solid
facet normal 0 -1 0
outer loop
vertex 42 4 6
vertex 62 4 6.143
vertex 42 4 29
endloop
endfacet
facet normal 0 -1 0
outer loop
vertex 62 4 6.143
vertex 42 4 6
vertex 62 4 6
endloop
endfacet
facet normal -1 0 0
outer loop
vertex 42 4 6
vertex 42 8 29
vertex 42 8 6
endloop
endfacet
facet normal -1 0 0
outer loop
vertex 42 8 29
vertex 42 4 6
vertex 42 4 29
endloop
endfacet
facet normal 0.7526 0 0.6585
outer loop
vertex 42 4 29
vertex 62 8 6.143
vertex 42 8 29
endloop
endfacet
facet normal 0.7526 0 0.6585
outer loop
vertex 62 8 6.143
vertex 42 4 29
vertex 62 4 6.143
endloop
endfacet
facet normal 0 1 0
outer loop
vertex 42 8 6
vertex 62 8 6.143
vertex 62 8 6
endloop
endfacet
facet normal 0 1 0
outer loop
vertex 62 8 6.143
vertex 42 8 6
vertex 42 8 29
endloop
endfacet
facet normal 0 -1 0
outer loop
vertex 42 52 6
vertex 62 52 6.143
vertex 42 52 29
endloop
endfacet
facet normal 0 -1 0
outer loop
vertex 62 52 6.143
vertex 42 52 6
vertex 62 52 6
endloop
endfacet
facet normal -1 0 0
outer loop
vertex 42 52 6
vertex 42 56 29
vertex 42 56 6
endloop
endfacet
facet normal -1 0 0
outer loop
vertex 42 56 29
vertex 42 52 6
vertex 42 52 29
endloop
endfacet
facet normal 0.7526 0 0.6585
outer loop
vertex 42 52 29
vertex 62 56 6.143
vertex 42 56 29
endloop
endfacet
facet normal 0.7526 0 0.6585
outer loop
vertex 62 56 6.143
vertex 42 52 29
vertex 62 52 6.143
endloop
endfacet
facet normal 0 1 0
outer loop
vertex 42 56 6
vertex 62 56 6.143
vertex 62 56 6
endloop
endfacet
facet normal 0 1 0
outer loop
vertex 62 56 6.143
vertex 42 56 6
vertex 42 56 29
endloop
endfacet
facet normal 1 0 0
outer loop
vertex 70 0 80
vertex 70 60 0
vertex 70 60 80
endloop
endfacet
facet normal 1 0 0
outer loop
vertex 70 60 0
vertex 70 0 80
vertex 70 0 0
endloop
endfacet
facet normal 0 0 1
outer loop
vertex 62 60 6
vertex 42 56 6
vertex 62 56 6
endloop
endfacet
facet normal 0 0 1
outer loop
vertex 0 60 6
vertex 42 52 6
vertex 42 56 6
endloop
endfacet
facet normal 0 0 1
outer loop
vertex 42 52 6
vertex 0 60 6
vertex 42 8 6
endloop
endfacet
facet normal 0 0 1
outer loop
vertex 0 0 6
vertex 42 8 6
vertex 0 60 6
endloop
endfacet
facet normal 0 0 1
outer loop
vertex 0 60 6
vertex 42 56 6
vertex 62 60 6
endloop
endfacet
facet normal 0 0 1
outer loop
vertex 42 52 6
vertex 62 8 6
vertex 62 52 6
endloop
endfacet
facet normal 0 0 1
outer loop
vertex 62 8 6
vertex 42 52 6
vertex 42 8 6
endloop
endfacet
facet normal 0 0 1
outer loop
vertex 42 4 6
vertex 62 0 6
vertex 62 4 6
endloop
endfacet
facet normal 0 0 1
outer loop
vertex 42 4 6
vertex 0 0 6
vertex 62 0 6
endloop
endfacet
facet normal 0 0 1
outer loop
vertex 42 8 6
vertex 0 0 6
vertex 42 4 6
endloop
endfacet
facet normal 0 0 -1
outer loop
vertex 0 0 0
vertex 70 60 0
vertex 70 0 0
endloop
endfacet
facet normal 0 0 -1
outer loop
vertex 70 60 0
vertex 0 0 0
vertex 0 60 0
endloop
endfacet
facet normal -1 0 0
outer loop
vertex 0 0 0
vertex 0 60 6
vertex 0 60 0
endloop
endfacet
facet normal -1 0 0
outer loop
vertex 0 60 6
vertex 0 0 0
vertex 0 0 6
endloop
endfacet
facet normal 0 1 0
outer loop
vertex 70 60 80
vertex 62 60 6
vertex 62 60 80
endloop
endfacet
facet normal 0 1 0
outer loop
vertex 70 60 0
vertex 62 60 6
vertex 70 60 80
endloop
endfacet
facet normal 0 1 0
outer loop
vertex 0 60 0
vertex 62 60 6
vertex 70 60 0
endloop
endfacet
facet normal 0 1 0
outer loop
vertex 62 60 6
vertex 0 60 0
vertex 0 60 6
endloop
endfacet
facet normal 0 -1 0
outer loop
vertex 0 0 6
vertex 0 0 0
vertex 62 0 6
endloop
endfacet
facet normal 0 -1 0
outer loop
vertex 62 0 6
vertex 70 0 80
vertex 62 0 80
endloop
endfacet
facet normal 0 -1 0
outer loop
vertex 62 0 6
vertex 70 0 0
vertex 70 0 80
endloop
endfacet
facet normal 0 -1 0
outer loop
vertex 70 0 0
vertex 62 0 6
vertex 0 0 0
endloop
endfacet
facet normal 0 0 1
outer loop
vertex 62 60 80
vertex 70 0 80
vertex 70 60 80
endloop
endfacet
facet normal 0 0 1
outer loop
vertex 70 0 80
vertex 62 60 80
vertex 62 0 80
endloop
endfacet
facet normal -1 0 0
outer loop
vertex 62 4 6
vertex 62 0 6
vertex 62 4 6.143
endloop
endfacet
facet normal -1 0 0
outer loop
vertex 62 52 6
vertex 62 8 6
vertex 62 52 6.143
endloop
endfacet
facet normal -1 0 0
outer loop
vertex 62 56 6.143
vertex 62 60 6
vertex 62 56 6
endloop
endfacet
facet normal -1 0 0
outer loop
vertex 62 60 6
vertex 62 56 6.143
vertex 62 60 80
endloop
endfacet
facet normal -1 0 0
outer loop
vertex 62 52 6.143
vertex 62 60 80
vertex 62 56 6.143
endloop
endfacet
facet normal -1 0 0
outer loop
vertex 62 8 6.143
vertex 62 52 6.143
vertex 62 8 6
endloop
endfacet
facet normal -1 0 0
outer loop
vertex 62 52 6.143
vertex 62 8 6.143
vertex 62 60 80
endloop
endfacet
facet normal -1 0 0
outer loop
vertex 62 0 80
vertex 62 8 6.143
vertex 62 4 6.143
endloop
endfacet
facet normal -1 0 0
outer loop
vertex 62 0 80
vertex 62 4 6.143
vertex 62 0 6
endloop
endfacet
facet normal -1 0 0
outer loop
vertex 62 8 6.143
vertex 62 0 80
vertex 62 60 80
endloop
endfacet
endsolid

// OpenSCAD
$fn = 32;

// ----------------------------------------------------------------------
// Rib bracket: 2-gusset L bracket
// ----------------------------------------------------------------------

// --- parameters (mm) ---
base_l = 70;              // foot length, X
base_w = 60;              // foot width, Y
base_t = 6;               // foot thickness
plate_t = 8;              // upright plate thickness
plate_h = 80;             // overall height
gus_l = 20;               // gusset leg along the foot
gus_h = 24;               // gusset height
gus_t = 4;                // gusset thickness
gus_edge = 4;             // gusset margin from the foot edge
n_gus = 2;                // gusset count

gus_pitch = (base_w - 2 * gus_edge - gus_t) / (n_gus - 1);  // gusset pitch

union() {
  cube([base_l, base_w, base_t]);
  translate([base_l - plate_t, 0, base_t - 1])
    cube([plate_t, base_w, plate_h - base_t + 1]);
  for (i = [0 : n_gus - 1])
    translate([base_l - plate_t - gus_l, gus_edge + i * gus_pitch, base_t - 1])
      rotate([-90, 0, 0])
        linear_extrude(height = gus_t)
          polygon(points = [[0, 0], [gus_l + 1, 0], [0, -gus_h]]);
}
